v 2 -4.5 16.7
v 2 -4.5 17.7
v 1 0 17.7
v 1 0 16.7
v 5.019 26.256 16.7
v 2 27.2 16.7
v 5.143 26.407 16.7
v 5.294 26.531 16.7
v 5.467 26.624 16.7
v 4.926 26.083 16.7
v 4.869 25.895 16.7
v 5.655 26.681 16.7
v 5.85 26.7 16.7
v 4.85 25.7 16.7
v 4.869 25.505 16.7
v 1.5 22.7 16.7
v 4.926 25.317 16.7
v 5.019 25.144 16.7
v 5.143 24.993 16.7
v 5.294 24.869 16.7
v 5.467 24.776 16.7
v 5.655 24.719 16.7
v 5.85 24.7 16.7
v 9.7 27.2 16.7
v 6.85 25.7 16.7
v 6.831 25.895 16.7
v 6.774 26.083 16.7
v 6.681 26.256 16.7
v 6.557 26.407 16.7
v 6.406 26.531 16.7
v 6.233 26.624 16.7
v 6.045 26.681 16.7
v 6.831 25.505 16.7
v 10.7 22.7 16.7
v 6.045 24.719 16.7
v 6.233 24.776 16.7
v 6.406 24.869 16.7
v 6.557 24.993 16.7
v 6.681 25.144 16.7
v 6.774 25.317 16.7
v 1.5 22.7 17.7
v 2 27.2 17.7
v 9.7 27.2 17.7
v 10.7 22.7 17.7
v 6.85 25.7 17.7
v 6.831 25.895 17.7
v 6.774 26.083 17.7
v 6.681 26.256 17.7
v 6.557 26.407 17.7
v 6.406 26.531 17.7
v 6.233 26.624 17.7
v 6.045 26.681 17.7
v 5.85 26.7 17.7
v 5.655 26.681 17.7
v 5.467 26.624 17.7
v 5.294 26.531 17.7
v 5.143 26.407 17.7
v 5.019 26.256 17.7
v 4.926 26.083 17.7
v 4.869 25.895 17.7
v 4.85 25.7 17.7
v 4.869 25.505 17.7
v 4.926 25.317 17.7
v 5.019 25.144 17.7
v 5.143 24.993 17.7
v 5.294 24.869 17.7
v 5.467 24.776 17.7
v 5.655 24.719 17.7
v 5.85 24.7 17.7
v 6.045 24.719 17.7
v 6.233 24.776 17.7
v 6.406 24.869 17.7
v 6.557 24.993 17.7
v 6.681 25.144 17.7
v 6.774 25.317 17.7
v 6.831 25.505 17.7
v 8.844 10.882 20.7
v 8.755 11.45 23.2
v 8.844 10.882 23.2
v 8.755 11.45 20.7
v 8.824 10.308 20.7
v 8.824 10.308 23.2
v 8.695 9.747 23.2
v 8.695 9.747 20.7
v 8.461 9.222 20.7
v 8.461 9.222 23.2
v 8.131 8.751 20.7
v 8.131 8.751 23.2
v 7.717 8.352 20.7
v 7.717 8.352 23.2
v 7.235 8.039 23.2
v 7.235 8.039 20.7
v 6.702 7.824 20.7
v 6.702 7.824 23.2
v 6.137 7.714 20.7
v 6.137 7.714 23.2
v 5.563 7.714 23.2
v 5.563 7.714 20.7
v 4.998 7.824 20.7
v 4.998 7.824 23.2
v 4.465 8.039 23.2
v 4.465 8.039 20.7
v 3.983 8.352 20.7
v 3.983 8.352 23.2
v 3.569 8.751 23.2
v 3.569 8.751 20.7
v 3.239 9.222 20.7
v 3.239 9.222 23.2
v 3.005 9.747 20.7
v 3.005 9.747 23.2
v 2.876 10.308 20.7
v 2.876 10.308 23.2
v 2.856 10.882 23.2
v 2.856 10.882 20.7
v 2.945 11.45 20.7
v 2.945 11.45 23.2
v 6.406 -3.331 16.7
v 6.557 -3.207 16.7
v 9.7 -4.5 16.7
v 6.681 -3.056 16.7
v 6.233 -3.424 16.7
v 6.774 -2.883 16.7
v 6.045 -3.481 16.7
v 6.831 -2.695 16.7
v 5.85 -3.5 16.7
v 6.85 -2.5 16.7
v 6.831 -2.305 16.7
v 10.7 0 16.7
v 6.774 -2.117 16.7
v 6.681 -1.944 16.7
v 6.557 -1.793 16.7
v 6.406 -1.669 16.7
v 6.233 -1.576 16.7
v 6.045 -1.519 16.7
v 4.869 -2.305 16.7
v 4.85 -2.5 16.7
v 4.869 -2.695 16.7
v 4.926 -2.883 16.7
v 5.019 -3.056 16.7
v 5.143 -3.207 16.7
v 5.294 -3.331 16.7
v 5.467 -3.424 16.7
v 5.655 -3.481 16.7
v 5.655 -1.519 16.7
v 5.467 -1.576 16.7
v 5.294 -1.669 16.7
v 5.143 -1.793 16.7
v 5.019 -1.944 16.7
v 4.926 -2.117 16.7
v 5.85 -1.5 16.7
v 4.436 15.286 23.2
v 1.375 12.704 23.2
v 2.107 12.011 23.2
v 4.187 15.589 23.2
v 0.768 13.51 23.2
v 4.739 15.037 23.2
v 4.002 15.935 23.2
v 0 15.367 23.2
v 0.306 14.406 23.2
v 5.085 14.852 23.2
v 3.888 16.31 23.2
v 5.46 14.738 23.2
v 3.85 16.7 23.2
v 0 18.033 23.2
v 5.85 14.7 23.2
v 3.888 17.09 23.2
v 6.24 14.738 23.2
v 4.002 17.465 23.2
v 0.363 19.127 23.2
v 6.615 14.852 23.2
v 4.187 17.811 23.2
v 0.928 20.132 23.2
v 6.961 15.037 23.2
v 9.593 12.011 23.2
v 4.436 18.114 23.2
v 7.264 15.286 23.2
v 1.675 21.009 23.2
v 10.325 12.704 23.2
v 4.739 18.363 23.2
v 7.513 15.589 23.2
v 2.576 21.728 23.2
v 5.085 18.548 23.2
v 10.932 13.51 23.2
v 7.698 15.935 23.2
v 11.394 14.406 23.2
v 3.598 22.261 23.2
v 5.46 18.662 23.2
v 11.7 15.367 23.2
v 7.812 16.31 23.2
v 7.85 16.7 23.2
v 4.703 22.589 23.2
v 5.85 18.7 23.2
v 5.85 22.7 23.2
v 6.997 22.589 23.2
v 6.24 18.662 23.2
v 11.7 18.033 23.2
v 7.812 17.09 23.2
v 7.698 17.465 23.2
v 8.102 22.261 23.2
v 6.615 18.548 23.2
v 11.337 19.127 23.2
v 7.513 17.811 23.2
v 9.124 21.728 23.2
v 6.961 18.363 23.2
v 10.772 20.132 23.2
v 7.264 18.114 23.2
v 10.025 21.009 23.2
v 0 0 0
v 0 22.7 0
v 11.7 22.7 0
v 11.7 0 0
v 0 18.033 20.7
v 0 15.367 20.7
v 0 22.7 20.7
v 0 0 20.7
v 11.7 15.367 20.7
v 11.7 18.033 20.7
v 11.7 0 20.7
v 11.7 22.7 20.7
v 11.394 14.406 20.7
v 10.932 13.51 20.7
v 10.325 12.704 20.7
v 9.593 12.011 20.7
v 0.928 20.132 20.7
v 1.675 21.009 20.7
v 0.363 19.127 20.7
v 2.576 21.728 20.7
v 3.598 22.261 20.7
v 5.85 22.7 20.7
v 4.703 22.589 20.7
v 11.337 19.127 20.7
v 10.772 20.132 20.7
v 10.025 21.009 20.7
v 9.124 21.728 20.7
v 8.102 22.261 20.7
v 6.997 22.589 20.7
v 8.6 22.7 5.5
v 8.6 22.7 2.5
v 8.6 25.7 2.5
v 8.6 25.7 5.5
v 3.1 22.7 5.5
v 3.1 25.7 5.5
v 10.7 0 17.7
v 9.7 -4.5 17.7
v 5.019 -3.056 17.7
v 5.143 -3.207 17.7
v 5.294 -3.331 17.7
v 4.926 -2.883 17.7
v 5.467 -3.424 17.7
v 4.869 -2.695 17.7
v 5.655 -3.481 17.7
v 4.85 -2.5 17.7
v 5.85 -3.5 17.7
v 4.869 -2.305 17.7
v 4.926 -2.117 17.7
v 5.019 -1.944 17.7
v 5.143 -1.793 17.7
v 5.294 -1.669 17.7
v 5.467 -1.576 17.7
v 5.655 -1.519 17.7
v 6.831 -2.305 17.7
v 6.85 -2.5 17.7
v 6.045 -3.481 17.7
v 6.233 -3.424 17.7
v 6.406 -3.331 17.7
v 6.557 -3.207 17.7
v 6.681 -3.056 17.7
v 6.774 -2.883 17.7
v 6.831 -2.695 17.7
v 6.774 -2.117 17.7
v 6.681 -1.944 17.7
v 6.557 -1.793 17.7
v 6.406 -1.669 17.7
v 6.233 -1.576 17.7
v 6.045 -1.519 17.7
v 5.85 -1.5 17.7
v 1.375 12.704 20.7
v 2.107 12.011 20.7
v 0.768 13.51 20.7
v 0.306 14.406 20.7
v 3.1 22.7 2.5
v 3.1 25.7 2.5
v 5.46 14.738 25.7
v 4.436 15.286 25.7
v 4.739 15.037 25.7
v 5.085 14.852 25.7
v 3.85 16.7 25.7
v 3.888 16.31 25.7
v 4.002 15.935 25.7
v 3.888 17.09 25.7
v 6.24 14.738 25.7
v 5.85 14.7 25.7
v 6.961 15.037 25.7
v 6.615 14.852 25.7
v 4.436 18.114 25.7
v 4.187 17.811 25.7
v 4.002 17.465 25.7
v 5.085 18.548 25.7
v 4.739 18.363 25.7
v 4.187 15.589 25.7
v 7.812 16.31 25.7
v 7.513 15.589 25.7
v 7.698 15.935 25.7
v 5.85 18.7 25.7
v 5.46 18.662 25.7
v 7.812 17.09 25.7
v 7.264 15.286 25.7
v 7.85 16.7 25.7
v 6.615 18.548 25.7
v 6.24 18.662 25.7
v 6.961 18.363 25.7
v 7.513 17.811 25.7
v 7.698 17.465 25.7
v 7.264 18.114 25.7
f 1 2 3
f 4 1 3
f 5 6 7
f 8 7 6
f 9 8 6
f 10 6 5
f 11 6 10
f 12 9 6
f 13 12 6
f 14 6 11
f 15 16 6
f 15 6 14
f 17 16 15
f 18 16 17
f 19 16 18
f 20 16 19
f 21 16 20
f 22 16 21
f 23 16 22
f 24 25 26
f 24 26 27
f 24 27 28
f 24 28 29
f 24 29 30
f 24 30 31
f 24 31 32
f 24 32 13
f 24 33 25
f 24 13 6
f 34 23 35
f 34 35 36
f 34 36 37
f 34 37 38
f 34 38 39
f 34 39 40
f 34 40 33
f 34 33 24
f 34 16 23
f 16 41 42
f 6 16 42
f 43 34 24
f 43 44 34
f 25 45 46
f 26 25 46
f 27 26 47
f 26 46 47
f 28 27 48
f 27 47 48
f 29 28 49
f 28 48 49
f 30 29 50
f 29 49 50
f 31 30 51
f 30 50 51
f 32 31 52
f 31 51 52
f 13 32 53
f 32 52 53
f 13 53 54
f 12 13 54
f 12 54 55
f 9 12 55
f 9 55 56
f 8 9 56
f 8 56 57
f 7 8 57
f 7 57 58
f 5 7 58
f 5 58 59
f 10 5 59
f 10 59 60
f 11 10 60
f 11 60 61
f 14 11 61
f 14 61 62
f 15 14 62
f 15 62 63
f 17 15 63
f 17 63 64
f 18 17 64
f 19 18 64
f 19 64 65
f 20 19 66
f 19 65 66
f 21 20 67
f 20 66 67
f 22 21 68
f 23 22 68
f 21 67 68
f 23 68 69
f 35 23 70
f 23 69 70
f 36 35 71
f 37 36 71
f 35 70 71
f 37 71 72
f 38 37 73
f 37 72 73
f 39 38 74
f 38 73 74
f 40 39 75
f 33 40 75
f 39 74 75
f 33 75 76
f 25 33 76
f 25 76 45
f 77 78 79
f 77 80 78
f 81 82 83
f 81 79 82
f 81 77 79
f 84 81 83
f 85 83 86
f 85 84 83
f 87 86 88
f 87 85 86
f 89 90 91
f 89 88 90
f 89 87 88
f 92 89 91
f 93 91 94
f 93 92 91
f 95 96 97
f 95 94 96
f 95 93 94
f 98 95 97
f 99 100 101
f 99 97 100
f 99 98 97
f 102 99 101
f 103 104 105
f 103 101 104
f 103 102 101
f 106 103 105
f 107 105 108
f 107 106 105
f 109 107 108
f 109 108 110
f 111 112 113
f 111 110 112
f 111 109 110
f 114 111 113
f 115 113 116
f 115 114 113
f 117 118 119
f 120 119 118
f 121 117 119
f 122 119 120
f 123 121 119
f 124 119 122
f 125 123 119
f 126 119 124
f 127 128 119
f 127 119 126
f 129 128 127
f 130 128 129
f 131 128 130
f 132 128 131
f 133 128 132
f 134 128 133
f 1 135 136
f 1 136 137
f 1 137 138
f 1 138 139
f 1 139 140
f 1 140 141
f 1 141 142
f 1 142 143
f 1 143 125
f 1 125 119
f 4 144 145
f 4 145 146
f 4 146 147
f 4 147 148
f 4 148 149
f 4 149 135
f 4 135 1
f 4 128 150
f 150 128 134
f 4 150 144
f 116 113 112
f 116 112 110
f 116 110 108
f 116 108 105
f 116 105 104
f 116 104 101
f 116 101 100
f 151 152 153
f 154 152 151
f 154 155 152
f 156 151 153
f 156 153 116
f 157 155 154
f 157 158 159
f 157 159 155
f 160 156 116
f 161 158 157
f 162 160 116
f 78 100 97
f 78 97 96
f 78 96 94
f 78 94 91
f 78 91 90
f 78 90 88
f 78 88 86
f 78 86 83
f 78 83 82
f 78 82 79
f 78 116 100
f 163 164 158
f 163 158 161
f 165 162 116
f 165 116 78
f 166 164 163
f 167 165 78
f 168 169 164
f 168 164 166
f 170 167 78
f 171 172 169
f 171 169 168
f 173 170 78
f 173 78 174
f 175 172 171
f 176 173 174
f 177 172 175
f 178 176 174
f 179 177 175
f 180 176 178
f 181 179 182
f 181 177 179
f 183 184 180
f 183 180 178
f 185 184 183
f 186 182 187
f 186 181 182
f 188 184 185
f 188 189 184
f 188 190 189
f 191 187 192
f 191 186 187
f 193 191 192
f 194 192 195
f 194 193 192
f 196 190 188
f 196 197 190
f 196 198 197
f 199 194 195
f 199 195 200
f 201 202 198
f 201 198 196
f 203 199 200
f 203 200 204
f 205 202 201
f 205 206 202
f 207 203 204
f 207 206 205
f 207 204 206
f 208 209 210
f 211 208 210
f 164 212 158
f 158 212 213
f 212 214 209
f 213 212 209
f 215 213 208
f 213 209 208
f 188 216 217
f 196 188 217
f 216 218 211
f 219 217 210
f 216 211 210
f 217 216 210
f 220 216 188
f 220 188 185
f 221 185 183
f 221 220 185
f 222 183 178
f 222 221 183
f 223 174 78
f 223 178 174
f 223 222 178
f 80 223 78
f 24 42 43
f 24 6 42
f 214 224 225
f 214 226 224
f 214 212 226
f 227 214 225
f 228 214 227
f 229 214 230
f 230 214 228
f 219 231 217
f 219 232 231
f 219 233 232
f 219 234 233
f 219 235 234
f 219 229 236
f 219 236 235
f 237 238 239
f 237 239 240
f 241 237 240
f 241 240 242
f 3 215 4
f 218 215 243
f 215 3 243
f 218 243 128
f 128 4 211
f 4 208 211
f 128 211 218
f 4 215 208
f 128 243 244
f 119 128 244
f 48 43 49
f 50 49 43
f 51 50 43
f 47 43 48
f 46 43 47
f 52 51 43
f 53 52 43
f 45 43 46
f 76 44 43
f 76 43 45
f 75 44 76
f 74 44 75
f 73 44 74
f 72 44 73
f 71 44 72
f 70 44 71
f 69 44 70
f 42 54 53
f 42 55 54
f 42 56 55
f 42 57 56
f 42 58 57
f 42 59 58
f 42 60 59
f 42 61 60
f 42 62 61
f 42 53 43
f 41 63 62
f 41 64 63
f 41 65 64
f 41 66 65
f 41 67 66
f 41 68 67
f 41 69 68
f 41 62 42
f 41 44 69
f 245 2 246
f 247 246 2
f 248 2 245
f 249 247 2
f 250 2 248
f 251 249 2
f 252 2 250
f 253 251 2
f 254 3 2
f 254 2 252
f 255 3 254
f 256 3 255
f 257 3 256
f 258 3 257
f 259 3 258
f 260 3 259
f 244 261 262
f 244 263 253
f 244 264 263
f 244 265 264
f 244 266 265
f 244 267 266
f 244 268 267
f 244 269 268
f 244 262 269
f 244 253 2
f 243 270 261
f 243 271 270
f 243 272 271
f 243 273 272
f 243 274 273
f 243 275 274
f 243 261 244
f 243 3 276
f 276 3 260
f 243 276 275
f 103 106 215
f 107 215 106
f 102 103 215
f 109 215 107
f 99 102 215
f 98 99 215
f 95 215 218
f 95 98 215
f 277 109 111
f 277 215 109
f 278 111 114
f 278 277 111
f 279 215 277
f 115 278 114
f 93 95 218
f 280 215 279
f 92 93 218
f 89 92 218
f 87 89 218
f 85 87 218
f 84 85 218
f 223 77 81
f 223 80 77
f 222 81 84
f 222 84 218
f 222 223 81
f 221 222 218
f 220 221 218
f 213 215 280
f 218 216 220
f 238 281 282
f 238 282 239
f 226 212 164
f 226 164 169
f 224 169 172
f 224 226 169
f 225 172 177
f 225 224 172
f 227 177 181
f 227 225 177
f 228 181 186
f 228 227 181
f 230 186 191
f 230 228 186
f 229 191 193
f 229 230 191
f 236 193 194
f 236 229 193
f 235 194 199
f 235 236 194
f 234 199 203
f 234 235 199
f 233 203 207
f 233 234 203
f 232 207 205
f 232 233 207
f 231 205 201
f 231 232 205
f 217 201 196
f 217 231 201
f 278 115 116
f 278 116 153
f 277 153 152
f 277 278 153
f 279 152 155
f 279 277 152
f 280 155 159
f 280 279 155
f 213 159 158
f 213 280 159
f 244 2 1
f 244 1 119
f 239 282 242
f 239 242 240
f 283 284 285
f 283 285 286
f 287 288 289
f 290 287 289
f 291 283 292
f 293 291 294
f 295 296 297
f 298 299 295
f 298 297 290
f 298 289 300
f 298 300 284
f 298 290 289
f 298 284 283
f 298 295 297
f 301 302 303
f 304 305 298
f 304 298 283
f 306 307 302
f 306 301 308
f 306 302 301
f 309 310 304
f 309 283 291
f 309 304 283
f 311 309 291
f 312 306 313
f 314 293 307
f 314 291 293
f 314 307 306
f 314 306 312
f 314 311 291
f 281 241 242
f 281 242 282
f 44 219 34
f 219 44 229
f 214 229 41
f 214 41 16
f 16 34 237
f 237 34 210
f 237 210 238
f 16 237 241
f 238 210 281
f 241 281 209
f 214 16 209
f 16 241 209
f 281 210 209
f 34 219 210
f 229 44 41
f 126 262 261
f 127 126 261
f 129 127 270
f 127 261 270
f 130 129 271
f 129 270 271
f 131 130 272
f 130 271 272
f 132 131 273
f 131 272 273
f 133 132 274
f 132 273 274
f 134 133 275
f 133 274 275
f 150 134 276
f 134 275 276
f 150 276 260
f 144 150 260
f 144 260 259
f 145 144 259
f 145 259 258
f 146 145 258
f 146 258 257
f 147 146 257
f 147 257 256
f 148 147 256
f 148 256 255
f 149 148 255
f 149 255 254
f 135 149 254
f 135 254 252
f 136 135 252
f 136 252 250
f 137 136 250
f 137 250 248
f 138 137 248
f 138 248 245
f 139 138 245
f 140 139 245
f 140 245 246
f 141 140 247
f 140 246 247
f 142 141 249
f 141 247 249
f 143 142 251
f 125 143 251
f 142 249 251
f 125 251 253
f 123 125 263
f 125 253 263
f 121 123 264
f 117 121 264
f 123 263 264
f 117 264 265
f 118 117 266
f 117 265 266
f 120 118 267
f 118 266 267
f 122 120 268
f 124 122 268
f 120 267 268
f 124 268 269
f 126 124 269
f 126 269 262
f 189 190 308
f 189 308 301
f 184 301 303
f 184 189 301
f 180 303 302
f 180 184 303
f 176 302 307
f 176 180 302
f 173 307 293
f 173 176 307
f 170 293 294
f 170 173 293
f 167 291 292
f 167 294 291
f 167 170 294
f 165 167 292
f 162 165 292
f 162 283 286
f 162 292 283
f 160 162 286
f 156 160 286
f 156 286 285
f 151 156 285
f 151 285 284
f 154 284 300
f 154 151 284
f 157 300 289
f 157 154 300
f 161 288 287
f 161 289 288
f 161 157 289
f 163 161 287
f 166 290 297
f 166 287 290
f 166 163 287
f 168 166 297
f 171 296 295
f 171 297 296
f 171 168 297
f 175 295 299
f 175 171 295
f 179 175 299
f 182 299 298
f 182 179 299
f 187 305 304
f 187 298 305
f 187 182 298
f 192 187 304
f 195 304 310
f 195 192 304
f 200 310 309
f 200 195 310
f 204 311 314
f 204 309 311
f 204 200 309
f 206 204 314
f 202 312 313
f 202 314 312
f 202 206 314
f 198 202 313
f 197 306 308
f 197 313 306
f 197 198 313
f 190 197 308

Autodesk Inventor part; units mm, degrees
ref_plane "YZ Plane" through (0, 0, 0) normal (1, 0, 0) x (0, 1, 0)
ref_plane "XZ Plane" through (0, 0, 0) normal (0, 1, 0) x (-1, 0, 0)
ref_plane "XY Plane" through (0, 0, 0) normal (0, 0, 1) x (1, 0, 0)
sketch "スケッチ1" plane through (0, 0, 0) normal (0, 0, 1) x (1, 0, 0)
  line L0 (0, 0) -> (11.7, 0)
  line L1 (11.7, 0) -> (11.7, 22.7)
  line L2 (11.7, 22.7) -> (0, 22.7)
  line L3 (0, 22.7) -> (0, 0)
  dimension "d0" = 11.7
  dimension "d1" = 22.7
extrude "押し出し1" add sketch "スケッチ1" along normal blind 20.7
sketch "スケッチ2" plane through (0, 0, 20.7) normal (0, 0, 1) x (1, 0, 0)
  line L0 (11.7, 22.7) -> (0, 22.7) projected
  arc A0 (2.9453, 11.45) -> (8.7547, 11.45) centre (5.85, 10.7) ccw
  line L1 (0, 22.7) -> (0, 0) projected
  line L2 (11.7, 0) -> (11.7, 22.7) projected
  arc A1 (0, 15.3668) -> (2.9453, 11.45) centre (5.85, 16.7) ccw
  arc A2 (8.7547, 11.45) -> (11.7, 15.3668) centre (5.85, 16.7) ccw
  arc A3 (11.7, 18.0332) -> (0, 18.0332) centre (5.85, 16.7) ccw
  dimension "d5" = 6
  dimension "d6" = 6
extrude "押し出し2" add sketch "スケッチ2" along normal blind 2.5 contours A3 L2 A2 A0 A1 L1
sketch "スケッチ3" plane through (0, 0, 23.2) normal (0, 0, 1) x (1, 0, 0)
  arc A0 (11.7, 18.0332) -> (0, 18.0332) centre (5.85, 16.7) ccw projected
  circle A1 centre (5.85, 16.7) radius 2
  point P0 (0, 0)
  dimension "d9" = 4
extrude "押し出し3" add sketch "スケッチ3" along normal blind 2.5
sketch "スケッチ4" plane through (0, 0, 0) normal (0, -1, 0) x (1, 0, 0)
  line L0 (11.7, 0) -> (11.7, 20.7) projected
  line L1 (0, 17.7) -> (11.7, 17.7)
  line L2 (11.7, 17.7) -> (11.7, 16.7)
  line L3 (11.7, 16.7) -> (0, 16.7)
  line L4 (0, 16.7) -> (0, 17.7)
  point P0 (0, 0)
  dimension "d12" = 1
extrude "押し出し4" add sketch "スケッチ4" along normal blind 4.5
sketch "スケッチ5" plane through (0, 22.7, 0) normal (0, 1, 0) x (1, 0, 0)
  line L0 (11.7, -17.7) -> (11.7, -20.7) projected
  line L1 (11.7, -17.7) -> (0, -17.7)
  line L2 (0, -17.7) -> (0, -16.7)
  line L3 (0, -16.7) -> (11.7, -16.7)
  line L4 (11.7, -16.7) -> (11.7, -17.7)
  point P0 (0, 0)
  dimension "d15" = 1
extrude "押し出し5" add sketch "スケッチ5" along normal blind 4.5
sketch "スケッチ6" plane through (0, 0, 17.7) normal (0, 0, 1) x (1, 0, 0)
  line L0 (0, -4.5) -> (11.7, -4.5) projected
  line L1 (2, -4.5) -> (1, 0)
  line L2 (0, 0) -> (11.7, 0) projected
  line L3 (10.7, 0) -> (9.7, -4.5)
  line L4 (0, 27.2) -> (11.7, 27.2) projected
  line L5 (5.85, 22.7) -> (0, 22.7) projected
  line L6 (1.5, 22.7) -> (2, 27.2)
  line L7 (11.7, 22.7) -> (0, 22.7) projected
  line L8 (10.7, 22.7) -> (9.7, 27.2)
  circle A0 centre (5.85, 25.7) radius 1
  circle A1 centre (5.85, -2.5) radius 1
  line L9 (11.7, -4.5) -> (11.7, 0)
  line L10 (0, 0) -> (0, -4.5)
  line L11 (0, 22.7) -> (0, 27.2)
  line L12 (11.7, 27.2) -> (11.7, 22.7)
  line L13 (0, -4.5) -> (0, 0)
  line L14 (11.7, 0) -> (11.7, -4.5)
  line L15 (0, 22.7) -> (0, 27.2)
  line L16 (11.7, 27.2) -> (11.7, 22.7)
  line L17 (11.7, -4.5) -> (9.7, -4.5)
  line L18 (2, -4.5) -> (0, -4.5)
  line L19 (0, 0) -> (1, 0)
  line L20 (10.7, 0) -> (11.7, 0)
  line L21 (11.7, 22.7) -> (10.7, 22.7)
  line L22 (1.5, 22.7) -> (0, 22.7)
  line L23 (0, 27.2) -> (2, 27.2)
  line L24 (9.7, 27.2) -> (11.7, 27.2)
  dimension "d18" = 2
  dimension "d19" = 2
extrude "押し出し6" cut sketch "スケッチ6" against normal blind 4.5 contours L10 L2 L1 L0 | L3 L2 L9 L0 | L4 L6 L5 L11 | L4 L12 L7 L8 | A0 | A1
sketch "スケッチ7" plane through (0, 22.7, 0) normal (0, 1, 0) x (1, 0, 0)
  line L0 (3.1, -2.5) -> (8.6, -2.5)
  line L1 (8.6, -2.5) -> (8.6, -5.5)
  line L2 (8.6, -5.5) -> (3.1, -5.5)
  line L3 (3.1, -5.5) -> (3.1, -2.5)
  line L4 (0, 0) -> (0, -20.7) projected
  dimension "d22" = 5.5
  dimension "d23" = 3
extrude "押し出し7" add sketch "スケッチ7" along normal blind 3
properties part number "RB-001-Servo" material "ABS プラスチック"
